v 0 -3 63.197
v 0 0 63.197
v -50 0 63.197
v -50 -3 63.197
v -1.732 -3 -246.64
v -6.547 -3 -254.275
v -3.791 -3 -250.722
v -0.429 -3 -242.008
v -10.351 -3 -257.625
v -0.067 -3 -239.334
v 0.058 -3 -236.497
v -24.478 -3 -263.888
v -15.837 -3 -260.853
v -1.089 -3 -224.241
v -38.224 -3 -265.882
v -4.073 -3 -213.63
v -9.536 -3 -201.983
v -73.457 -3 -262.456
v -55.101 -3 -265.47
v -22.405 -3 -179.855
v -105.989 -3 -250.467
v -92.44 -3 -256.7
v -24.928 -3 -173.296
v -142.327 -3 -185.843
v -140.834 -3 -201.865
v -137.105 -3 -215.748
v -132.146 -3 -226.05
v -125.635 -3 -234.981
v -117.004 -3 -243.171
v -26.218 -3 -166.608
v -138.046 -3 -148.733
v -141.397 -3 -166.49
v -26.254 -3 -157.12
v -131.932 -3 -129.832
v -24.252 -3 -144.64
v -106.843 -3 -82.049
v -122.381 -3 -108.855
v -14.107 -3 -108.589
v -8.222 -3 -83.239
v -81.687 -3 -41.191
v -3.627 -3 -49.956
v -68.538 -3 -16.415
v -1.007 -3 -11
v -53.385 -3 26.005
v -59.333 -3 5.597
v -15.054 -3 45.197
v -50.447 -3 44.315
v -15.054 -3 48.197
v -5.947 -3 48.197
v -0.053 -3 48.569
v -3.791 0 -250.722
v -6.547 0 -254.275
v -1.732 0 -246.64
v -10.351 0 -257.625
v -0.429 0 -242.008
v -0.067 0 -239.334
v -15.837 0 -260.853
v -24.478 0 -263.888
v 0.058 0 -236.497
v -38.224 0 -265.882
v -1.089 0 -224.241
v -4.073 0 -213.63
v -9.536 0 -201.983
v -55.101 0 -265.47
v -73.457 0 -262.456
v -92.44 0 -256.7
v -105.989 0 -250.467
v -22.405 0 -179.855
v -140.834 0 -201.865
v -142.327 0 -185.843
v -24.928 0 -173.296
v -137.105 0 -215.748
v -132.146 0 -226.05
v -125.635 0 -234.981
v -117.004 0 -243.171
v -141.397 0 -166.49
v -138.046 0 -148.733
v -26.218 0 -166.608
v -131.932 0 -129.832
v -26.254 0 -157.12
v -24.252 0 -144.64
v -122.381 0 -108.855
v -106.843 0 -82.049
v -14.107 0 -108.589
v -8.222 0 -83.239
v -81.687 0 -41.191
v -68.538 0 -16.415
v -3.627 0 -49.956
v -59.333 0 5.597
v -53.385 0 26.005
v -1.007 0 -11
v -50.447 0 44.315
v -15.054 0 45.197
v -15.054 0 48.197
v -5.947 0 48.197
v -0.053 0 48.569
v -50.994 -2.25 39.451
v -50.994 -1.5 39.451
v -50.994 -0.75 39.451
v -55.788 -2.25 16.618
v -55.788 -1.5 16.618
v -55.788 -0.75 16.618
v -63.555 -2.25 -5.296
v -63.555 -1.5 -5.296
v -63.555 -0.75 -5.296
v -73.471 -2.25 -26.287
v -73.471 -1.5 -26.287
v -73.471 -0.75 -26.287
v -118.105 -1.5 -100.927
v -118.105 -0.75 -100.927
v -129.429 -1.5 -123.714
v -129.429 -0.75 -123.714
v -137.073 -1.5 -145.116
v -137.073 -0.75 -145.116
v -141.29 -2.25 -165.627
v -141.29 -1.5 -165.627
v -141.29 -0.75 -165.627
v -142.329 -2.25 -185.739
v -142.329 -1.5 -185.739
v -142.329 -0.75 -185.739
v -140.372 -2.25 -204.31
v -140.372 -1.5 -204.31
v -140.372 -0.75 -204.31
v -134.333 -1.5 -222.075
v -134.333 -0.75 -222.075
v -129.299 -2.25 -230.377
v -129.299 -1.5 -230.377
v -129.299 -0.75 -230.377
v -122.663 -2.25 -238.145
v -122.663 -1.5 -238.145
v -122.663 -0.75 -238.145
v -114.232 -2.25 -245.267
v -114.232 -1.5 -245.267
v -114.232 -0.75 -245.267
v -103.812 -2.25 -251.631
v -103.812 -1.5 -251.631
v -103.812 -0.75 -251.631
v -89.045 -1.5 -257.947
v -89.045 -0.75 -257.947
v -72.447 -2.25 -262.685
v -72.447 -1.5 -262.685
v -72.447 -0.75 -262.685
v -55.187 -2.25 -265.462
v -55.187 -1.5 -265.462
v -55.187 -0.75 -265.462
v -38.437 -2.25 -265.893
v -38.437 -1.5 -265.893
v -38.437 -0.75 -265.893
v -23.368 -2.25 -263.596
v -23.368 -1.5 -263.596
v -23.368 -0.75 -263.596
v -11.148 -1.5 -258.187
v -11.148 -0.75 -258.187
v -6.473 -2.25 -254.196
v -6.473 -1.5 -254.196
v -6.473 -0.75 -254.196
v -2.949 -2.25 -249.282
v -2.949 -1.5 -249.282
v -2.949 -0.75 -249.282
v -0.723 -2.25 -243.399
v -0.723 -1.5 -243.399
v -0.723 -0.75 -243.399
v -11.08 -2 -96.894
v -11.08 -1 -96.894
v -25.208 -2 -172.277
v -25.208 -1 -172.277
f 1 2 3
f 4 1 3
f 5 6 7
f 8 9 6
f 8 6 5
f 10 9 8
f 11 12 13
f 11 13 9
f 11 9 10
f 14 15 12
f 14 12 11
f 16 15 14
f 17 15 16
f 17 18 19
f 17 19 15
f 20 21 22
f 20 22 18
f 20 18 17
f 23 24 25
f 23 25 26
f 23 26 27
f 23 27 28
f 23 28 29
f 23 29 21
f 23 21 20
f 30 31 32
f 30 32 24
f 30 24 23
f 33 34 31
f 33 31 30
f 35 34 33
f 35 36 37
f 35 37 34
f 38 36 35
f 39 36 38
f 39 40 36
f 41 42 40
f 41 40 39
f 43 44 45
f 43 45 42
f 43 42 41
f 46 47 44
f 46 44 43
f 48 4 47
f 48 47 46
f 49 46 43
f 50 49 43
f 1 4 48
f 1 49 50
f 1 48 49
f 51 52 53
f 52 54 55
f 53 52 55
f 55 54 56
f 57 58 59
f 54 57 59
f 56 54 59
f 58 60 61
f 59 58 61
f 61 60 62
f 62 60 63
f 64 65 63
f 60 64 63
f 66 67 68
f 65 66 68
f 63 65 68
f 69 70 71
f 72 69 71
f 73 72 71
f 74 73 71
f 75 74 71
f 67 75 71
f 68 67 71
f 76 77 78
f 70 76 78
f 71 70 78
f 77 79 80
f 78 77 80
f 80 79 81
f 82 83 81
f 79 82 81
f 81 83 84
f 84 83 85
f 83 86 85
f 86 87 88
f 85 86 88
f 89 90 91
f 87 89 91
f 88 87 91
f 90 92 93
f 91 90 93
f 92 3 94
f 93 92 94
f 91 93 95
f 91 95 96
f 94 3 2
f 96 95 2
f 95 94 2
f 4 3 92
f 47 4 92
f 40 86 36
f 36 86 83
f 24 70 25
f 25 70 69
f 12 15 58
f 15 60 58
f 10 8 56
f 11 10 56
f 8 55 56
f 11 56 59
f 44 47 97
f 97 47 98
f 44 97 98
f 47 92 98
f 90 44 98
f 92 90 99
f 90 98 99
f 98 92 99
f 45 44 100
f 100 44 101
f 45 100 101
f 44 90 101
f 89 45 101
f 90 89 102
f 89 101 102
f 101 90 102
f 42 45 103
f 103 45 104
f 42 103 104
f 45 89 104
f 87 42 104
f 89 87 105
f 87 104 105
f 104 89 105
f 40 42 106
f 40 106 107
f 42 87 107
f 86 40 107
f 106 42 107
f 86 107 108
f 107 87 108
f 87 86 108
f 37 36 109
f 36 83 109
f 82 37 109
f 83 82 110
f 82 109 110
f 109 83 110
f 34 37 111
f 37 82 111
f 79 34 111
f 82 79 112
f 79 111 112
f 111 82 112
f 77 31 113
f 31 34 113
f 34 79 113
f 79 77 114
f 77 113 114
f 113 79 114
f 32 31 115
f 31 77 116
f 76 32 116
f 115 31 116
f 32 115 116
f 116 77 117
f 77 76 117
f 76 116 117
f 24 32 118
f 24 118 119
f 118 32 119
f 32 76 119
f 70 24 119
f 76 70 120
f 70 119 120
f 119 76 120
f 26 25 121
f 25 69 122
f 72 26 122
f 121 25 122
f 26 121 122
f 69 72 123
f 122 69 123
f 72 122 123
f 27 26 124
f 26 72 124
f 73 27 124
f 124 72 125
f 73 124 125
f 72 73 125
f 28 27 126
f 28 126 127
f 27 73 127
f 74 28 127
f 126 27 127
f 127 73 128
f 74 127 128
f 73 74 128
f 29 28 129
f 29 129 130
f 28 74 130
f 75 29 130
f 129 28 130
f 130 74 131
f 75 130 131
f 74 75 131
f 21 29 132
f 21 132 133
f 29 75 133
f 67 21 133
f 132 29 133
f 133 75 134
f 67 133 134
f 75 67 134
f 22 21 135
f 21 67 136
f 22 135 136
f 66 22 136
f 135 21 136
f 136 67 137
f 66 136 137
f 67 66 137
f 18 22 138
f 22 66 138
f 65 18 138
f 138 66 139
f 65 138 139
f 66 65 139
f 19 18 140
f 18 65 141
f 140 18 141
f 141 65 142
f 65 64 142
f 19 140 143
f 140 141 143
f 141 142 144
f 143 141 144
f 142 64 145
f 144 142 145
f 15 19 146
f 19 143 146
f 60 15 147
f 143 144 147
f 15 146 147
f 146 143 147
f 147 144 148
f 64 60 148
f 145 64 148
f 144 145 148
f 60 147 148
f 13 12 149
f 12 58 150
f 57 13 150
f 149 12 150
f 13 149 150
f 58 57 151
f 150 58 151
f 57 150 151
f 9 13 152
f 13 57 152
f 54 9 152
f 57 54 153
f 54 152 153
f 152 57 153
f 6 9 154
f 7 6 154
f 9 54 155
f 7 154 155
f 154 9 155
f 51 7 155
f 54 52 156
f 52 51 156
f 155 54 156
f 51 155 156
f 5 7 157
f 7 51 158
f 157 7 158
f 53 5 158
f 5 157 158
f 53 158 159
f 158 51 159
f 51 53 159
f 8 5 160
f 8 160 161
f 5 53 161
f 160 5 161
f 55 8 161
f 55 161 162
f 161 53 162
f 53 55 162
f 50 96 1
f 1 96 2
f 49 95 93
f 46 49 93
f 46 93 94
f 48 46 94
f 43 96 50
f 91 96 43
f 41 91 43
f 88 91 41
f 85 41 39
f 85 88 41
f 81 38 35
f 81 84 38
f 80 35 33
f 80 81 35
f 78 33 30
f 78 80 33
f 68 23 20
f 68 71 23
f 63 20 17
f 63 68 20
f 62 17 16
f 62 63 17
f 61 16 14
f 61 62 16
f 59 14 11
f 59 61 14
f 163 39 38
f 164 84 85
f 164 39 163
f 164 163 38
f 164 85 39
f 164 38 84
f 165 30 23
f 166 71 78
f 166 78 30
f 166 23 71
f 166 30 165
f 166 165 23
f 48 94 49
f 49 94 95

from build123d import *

# Parameters (mm, degrees)
F1_DEPTH = 3


with BuildPart() as f1:
    # F0 (on Front) → F1 (new body)
    with BuildSketch(Plane.XZ):
        with BuildLine():
            Line((-0.0529616107, 48.5688680409), (0, 63.1966261176))
            Line((0, 63.1966261176), (-50, 63.1966261176))
            add(Edge.make_bspline(
                [(-50, 63.1966261176), (-46.8510376398, -1.3401209196), (-125.5743059459, -94.8182731653), (-149.6306044119, -183.6330319601), (-125.8272238071, -265.2318757542), (0, -276.1036621388), (0.0583705459, -236.4973720111)],
                knots=[0, 0, 0, 0, 0.3196409048, 0.5448421319, 0.7543287392, 1, 1, 1, 1], degree=3))
            add(Edge.make_bspline(
                [(-0.0529616107, 48.5688680409), (-0.0216927736, -1.1288597334), (-1.8834100071, -93.6889248449), (-41.7458763761, -175.9251427873), (0, -205.4941677464), (0.0583705459, -236.4973720111)],
                knots=[0.0043323289, 0.0043323289, 0.0043323289, 0.0043323289, 0.4157359652, 0.7155753978, 1, 1, 1, 1], degree=3))
        make_face()
        Polygon((-15.0543090027, 48.1967244335), (-5.9466366033, 48.1967244335), (-15.0543090027, 45.1967244335), align=None, mode=Mode.SUBTRACT)
        with BuildLine():
            add(Edge.make_bspline(
                [(-0.0543090027, 50.1376136121), (-0.0537430558, 49.6151362408), (-0.0532908904, 49.0922151509), (-0.0529616107, 48.5688680409)],
                knots=[0, 0, 0, 0, 0.0043323289, 0.0043323289, 0.0043323289, 0.0043323289], degree=3))
            Line((-0.0529616107, 48.5688680409), (-0.0543090027, 48.1967244335))
            Line((-0.0543090027, 48.1967244335), (-5.9466366033, 48.1967244335))
            Line((-5.9466366033, 48.1967244335), (-0.0543090027, 50.1376136121))
        make_face(mode=Mode.SUBTRACT)
        with BuildLine():
            Line((-0.0543090027, 48.1967244335), (-0.0529616107, 48.5688680409))
            add(Edge.make_bspline(
                [(-0.0543090027, 50.1376136121), (-0.0537430558, 49.6151362408), (-0.0532908904, 49.0922151509), (-0.0529616107, 48.5688680409)],
                knots=[0, 0, 0, 0, 0.0043323289, 0.0043323289, 0.0043323289, 0.0043323289], degree=3))
            Line((-0.0543090027, 50.1376136121), (-5.9466366033, 48.1967244335))
            Line((-5.9466366033, 48.1967244335), (-0.0543090027, 48.1967244335))
        make_face()
    extrude(amount=F1_DEPTH)


solid = f1.part
